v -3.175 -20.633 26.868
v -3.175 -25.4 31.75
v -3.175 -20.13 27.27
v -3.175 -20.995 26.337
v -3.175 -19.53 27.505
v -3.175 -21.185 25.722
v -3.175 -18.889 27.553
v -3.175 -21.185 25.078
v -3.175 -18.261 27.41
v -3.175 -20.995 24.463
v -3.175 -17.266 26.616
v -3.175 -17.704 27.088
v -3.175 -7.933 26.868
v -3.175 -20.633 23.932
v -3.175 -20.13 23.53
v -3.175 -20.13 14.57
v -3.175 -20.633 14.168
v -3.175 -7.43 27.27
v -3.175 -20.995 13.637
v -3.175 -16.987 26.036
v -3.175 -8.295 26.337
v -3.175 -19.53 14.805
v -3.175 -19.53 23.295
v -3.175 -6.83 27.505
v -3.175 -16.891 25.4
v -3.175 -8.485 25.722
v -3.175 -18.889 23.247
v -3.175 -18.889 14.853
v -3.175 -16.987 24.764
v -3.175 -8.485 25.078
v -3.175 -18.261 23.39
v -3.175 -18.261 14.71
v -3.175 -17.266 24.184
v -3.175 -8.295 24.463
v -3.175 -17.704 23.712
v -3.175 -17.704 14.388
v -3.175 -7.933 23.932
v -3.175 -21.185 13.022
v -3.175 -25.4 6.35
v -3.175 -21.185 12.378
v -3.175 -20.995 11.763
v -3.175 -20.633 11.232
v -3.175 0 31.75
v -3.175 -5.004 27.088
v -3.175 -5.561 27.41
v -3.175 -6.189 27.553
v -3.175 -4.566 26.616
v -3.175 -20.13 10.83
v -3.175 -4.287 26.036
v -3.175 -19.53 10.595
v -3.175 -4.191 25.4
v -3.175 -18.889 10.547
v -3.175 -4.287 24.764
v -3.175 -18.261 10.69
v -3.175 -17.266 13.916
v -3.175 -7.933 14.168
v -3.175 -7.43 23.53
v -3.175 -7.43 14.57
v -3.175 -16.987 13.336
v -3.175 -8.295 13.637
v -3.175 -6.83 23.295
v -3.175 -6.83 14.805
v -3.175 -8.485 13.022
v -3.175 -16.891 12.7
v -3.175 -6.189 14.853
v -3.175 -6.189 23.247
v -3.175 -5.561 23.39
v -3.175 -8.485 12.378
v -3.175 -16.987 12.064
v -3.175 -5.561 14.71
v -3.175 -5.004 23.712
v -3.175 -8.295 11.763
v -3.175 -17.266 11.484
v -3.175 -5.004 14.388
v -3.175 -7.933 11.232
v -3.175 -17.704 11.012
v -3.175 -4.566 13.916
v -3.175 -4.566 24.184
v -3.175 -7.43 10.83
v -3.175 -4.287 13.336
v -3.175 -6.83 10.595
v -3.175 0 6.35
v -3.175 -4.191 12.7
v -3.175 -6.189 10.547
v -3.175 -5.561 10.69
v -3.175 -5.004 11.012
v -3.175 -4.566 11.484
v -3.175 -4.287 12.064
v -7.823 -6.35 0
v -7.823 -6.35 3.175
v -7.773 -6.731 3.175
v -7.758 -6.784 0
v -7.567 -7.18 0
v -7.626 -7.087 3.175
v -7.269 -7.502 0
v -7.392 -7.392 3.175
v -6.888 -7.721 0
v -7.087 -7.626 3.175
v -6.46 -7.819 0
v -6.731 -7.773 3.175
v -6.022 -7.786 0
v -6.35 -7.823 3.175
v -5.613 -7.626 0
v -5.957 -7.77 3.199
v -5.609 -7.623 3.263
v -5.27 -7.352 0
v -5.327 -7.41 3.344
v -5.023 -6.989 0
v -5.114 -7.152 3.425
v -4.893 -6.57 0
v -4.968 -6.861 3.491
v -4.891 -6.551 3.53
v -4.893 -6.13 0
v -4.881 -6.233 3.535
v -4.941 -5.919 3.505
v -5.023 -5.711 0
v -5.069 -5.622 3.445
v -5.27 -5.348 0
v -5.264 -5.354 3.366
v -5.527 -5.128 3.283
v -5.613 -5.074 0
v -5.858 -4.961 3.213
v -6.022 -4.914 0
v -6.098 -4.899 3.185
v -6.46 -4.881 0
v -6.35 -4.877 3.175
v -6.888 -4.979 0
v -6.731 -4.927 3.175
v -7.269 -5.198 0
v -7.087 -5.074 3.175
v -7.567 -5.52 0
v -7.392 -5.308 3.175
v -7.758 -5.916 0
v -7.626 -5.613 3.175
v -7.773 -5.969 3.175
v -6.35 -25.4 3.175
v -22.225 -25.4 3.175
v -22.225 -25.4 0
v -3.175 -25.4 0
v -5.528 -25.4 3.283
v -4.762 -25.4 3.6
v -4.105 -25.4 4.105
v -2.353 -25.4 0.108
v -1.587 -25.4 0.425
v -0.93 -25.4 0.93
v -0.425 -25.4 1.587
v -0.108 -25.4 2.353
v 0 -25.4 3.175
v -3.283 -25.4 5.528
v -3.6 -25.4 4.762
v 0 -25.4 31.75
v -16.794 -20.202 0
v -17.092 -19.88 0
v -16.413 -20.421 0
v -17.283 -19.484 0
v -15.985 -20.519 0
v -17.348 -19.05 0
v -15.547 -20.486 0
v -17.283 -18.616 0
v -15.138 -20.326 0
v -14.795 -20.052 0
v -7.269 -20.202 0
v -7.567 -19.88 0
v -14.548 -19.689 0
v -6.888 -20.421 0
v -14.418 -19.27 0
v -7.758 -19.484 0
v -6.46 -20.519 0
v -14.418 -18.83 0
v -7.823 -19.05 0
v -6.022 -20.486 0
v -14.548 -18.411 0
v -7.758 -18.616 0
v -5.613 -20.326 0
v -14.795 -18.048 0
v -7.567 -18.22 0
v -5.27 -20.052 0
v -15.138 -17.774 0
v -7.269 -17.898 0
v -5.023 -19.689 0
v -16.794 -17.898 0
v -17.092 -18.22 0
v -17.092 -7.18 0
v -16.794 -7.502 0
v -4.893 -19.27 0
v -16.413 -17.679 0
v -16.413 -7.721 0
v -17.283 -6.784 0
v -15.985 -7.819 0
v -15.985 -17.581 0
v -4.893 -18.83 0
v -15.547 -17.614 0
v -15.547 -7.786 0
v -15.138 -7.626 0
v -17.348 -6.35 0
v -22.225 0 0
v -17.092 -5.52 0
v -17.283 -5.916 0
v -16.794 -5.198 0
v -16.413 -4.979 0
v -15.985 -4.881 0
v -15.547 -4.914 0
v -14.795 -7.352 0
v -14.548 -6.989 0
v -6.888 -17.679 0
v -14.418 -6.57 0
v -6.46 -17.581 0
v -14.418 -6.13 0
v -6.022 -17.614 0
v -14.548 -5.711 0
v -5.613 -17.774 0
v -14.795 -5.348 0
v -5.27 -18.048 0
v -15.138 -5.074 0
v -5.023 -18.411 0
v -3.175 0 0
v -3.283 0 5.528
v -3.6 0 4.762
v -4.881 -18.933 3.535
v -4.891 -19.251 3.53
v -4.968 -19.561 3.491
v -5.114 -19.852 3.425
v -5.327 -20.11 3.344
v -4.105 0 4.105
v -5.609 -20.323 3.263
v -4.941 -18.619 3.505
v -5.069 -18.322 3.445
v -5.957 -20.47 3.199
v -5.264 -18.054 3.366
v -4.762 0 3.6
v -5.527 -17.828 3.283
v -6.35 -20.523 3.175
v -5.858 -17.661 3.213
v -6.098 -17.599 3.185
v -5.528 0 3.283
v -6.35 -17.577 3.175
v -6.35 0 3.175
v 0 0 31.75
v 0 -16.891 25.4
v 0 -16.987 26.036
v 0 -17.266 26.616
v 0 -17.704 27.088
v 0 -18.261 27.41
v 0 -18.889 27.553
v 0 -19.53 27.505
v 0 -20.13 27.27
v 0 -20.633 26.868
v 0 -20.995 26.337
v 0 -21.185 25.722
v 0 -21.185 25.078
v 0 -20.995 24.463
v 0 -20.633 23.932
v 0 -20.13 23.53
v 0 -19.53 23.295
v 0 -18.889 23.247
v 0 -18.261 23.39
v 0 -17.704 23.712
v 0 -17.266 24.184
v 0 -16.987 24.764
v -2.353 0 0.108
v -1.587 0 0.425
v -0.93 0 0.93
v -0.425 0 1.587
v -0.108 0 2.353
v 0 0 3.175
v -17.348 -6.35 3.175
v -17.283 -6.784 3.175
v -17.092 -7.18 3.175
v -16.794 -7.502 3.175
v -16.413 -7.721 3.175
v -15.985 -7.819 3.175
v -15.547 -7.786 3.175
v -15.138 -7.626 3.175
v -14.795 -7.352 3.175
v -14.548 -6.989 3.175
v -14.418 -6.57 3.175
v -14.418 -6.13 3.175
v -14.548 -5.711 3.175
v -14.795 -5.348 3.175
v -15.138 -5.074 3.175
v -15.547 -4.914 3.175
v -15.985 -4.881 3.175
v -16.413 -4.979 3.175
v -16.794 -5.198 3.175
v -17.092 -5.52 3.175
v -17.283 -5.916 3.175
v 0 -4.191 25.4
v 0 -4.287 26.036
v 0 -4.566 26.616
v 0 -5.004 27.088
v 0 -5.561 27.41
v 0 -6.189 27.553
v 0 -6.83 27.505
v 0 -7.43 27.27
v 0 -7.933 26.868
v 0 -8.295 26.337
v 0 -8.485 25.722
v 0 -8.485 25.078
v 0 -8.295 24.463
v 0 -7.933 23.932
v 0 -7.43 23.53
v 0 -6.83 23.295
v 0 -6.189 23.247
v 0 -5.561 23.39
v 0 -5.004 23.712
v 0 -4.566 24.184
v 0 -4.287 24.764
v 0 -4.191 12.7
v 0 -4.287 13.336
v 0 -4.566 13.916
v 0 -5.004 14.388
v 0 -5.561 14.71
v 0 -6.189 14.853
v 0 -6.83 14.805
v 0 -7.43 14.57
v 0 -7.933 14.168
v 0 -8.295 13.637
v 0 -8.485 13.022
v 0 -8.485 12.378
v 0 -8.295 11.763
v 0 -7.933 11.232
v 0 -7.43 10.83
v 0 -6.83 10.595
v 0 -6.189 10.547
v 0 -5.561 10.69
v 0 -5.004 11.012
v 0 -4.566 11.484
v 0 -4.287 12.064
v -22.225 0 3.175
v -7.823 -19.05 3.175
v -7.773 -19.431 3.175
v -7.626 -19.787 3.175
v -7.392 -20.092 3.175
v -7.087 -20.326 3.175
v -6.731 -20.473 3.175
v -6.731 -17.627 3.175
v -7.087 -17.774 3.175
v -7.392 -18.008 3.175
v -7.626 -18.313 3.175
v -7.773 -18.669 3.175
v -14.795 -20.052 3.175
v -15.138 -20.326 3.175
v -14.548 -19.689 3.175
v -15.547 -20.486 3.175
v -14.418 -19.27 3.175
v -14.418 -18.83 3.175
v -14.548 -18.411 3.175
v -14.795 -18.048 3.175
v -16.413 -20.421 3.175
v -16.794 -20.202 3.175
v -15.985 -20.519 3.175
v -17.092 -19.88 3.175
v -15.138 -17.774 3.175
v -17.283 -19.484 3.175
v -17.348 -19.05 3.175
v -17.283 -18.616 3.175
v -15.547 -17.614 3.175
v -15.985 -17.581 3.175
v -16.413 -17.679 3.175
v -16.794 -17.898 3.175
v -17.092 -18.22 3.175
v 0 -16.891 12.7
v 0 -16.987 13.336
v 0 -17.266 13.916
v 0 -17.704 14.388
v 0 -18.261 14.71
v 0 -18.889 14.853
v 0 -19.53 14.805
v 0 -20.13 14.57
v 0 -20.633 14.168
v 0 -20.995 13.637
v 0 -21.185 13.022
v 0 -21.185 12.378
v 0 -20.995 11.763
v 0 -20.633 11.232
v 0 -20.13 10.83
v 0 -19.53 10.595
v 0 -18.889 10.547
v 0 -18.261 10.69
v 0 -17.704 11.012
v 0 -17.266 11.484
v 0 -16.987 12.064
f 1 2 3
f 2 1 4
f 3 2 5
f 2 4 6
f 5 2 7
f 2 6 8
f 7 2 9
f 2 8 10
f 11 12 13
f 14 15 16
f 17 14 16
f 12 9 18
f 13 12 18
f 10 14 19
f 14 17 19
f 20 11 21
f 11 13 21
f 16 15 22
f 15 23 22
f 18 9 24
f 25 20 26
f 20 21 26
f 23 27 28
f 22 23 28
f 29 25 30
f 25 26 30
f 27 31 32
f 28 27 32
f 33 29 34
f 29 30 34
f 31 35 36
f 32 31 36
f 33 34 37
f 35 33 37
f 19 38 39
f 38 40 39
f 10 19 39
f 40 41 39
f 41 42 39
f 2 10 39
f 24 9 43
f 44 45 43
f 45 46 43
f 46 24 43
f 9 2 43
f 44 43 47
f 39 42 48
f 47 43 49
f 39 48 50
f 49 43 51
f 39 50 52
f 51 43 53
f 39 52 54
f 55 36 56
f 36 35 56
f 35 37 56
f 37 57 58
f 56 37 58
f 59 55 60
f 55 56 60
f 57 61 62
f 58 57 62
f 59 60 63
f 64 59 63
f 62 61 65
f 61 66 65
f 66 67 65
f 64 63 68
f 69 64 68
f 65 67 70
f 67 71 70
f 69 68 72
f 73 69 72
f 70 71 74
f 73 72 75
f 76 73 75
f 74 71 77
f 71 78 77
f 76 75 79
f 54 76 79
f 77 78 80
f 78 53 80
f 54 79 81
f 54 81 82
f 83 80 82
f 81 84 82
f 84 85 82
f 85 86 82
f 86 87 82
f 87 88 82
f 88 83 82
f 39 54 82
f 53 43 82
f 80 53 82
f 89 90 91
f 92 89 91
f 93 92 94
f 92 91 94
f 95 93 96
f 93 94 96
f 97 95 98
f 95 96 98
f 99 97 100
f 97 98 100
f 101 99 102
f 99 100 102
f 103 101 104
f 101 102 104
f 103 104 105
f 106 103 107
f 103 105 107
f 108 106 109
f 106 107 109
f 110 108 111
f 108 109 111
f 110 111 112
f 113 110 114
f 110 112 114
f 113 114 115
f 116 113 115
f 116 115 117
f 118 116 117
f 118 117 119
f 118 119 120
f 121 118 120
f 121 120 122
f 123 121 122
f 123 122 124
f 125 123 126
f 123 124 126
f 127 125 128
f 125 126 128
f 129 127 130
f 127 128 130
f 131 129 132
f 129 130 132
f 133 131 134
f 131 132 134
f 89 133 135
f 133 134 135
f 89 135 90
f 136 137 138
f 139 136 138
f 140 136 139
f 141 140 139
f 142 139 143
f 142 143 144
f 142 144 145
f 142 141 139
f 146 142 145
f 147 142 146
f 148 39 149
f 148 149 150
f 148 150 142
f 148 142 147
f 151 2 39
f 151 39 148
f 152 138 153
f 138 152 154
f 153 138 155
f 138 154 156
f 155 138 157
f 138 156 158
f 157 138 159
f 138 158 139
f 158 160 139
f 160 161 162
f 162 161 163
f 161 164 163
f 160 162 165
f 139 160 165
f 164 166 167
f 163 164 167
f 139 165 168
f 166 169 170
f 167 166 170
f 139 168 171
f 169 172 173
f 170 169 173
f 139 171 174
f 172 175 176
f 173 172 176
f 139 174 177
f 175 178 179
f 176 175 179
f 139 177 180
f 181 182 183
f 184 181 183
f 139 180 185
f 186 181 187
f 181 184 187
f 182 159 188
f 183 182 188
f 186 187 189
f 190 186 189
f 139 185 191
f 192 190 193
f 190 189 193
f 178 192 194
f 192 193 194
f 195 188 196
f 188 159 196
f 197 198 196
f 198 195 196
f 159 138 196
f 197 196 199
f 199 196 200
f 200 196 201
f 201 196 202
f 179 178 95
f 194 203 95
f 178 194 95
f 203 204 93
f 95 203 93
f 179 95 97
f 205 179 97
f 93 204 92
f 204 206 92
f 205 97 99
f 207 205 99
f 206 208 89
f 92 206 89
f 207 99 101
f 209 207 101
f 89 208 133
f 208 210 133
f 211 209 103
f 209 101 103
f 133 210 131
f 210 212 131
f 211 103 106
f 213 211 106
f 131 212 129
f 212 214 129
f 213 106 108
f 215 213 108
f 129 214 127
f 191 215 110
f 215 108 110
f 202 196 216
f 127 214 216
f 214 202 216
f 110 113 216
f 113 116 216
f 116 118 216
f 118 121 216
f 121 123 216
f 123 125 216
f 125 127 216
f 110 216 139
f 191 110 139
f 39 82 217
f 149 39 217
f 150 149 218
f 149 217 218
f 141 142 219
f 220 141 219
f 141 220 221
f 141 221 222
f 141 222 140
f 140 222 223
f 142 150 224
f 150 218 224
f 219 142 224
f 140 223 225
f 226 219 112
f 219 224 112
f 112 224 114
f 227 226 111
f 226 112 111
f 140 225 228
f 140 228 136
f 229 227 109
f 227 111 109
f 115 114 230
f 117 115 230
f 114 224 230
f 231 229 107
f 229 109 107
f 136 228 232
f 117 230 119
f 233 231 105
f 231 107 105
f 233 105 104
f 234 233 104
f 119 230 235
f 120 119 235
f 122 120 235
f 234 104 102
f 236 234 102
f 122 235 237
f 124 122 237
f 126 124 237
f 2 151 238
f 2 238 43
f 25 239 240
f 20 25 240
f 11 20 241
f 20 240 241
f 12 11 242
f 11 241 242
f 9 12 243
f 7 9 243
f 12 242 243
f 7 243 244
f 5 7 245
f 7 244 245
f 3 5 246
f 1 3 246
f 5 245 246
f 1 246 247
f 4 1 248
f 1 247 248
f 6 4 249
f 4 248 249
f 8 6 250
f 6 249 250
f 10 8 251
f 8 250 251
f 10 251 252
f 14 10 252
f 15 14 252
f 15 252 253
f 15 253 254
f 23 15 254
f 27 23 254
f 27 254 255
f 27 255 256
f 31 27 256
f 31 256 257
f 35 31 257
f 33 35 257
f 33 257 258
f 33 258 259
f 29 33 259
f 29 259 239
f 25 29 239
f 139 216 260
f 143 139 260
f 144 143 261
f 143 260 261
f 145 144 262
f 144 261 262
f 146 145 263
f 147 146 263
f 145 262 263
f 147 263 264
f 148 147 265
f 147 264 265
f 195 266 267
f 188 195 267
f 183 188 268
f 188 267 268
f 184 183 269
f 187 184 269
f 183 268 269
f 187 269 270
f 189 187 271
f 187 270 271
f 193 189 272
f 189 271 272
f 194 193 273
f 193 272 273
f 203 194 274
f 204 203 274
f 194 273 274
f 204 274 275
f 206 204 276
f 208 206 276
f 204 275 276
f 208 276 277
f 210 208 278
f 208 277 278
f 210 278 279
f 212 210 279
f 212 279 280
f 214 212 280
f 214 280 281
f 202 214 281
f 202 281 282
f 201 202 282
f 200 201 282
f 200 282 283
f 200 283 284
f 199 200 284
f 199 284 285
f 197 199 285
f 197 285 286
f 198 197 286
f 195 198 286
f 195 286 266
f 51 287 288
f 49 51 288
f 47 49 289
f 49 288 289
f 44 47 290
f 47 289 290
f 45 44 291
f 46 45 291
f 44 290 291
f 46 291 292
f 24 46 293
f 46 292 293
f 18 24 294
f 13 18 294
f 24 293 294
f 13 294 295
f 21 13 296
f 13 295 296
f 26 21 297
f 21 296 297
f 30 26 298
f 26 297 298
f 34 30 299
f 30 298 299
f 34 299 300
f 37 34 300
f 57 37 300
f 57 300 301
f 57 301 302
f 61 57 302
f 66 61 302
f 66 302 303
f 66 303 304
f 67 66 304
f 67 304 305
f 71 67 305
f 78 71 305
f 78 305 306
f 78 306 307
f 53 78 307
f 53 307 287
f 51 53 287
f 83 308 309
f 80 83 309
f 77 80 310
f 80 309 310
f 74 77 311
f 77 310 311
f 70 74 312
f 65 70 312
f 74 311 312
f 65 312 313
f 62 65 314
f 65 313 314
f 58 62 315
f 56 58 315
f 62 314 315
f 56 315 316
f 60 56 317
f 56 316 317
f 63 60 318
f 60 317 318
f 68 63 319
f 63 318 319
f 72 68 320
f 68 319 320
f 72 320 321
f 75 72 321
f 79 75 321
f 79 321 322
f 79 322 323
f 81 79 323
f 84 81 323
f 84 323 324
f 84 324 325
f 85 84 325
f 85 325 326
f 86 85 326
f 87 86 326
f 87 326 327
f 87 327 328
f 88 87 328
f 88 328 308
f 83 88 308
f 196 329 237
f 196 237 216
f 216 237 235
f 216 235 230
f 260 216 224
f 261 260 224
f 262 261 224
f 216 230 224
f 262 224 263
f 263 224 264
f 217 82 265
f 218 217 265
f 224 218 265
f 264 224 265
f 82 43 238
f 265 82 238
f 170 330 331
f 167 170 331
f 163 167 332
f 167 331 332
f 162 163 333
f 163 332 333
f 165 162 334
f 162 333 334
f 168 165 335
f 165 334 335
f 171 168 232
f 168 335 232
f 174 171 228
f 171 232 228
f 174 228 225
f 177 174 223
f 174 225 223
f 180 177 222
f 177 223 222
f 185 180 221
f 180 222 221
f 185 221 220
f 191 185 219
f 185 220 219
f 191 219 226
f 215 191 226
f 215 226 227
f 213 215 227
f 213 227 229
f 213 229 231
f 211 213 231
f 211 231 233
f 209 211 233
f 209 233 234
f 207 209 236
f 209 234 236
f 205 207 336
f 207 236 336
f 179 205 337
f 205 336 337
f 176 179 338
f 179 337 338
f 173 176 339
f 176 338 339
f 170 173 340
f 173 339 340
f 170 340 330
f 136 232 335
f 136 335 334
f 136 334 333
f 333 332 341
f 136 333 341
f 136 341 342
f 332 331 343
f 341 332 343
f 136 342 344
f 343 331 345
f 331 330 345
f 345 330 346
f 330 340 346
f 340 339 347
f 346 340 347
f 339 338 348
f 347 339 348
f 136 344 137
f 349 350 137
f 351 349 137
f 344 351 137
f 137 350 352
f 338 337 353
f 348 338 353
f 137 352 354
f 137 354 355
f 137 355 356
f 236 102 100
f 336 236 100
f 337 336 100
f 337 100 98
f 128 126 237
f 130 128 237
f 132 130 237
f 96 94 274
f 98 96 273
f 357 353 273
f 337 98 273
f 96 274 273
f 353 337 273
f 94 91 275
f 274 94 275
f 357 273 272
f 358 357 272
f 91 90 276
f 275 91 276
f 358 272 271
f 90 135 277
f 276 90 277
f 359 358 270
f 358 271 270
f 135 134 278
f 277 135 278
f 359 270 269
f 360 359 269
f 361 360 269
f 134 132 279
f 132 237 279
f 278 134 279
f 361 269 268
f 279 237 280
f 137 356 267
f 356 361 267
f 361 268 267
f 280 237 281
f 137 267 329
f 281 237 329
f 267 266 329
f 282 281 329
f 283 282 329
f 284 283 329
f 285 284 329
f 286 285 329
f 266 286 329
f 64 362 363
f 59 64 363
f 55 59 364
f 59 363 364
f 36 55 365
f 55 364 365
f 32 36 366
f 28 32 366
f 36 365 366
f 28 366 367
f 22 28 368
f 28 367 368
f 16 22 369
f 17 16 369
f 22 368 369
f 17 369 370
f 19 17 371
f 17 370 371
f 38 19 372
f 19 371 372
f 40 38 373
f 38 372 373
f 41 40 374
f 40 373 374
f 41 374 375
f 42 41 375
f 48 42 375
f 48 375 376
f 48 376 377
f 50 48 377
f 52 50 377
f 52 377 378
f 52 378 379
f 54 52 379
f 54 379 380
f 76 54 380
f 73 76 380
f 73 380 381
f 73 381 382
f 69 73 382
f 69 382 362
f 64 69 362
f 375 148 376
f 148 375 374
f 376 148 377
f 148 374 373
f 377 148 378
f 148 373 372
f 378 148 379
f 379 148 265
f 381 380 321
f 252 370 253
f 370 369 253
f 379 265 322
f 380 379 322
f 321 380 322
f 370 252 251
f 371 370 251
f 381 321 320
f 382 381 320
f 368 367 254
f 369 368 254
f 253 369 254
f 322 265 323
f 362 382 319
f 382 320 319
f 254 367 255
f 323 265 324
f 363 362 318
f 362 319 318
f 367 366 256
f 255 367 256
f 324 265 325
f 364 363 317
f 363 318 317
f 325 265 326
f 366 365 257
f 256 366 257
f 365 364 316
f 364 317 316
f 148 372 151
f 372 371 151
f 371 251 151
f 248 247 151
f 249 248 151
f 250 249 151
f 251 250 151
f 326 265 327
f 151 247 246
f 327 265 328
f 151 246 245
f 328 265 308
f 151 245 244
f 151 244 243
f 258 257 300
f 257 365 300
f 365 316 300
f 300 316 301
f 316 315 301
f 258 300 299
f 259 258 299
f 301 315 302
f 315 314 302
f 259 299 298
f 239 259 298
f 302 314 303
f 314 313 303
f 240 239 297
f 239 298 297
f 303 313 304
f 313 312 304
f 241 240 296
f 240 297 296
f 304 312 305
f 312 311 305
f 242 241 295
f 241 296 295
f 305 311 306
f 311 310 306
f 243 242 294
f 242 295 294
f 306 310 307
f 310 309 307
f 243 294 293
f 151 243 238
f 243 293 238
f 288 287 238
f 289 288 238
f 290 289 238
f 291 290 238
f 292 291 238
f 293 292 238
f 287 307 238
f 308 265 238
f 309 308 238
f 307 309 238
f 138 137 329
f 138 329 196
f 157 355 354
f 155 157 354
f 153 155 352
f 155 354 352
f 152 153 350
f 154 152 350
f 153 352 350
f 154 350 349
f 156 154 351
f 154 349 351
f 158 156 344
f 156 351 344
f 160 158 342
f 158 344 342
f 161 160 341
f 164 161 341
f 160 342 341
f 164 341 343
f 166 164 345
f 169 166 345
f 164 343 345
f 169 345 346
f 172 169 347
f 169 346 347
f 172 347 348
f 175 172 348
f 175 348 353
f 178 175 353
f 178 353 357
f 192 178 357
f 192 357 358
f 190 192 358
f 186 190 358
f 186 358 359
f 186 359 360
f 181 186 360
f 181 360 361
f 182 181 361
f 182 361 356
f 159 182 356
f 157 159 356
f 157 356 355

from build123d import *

# Parameters (mm, degrees)
F1_DEPTH = 25.4
F3_D     = 4.318
F3_DEPTH = 5.08
F3_TIP   = 1.2972580765
F5_D     = 2.9464
F5_DEPTH = 5.08
F5_TIP   = 0.885187864


with BuildPart() as f1:
    # F0 (on Front) → F1 (new body)
    with BuildSketch(Plane.XZ):
        with BuildLine():
            ThreePointArc((-3.175, 0), (-0.9299359697, 0.9299359697), (0, 3.175))
            Line((0, 3.175), (0, 31.75))
            Line((0, 31.75), (-3.175, 31.75))
            Line((-3.175, 31.75), (-3.175, 6.35))
            ThreePointArc((-3.175, 6.35), (-4.1049359697, 4.1049359697), (-6.35, 3.175))
            Line((-6.35, 3.175), (-22.225, 3.175))
            Line((-22.225, 3.175), (-22.225, 0))
            Line((-22.225, 0), (-3.175, 0))
        make_face()
    extrude(amount=F1_DEPTH)

    # F3
    with Locations(Plane(origin=(-3.175, 0, 0), x_dir=(0, -1, 0), z_dir=(-1, 0, 0))):
        with Locations((6.35, 12.7), (6.35, 25.4), (19.05, 25.4), (19.05, 12.7)):
            Hole(F3_D / 2, depth=F3_DEPTH)
            with Locations((0, 0, -(F3_DEPTH + F3_TIP / 2))):  # 118° drill point
                Cone(0, F3_D / 2, F3_TIP, mode=Mode.SUBTRACT)

    # F5
    with Locations(Plane(origin=(0, 0, 0), x_dir=(1, 0, 0), z_dir=(0, 0, -1))):
        with Locations((-6.35, 6.35), (-6.35, 19.05), (-15.875, 19.05), (-15.875, 6.35)):
            Hole(F5_D / 2, depth=F5_DEPTH)
            with Locations((0, 0, -(F5_DEPTH + F5_TIP / 2))):  # 118° drill point
                Cone(0, F5_D / 2, F5_TIP, mode=Mode.SUBTRACT)


solid = f1.part
